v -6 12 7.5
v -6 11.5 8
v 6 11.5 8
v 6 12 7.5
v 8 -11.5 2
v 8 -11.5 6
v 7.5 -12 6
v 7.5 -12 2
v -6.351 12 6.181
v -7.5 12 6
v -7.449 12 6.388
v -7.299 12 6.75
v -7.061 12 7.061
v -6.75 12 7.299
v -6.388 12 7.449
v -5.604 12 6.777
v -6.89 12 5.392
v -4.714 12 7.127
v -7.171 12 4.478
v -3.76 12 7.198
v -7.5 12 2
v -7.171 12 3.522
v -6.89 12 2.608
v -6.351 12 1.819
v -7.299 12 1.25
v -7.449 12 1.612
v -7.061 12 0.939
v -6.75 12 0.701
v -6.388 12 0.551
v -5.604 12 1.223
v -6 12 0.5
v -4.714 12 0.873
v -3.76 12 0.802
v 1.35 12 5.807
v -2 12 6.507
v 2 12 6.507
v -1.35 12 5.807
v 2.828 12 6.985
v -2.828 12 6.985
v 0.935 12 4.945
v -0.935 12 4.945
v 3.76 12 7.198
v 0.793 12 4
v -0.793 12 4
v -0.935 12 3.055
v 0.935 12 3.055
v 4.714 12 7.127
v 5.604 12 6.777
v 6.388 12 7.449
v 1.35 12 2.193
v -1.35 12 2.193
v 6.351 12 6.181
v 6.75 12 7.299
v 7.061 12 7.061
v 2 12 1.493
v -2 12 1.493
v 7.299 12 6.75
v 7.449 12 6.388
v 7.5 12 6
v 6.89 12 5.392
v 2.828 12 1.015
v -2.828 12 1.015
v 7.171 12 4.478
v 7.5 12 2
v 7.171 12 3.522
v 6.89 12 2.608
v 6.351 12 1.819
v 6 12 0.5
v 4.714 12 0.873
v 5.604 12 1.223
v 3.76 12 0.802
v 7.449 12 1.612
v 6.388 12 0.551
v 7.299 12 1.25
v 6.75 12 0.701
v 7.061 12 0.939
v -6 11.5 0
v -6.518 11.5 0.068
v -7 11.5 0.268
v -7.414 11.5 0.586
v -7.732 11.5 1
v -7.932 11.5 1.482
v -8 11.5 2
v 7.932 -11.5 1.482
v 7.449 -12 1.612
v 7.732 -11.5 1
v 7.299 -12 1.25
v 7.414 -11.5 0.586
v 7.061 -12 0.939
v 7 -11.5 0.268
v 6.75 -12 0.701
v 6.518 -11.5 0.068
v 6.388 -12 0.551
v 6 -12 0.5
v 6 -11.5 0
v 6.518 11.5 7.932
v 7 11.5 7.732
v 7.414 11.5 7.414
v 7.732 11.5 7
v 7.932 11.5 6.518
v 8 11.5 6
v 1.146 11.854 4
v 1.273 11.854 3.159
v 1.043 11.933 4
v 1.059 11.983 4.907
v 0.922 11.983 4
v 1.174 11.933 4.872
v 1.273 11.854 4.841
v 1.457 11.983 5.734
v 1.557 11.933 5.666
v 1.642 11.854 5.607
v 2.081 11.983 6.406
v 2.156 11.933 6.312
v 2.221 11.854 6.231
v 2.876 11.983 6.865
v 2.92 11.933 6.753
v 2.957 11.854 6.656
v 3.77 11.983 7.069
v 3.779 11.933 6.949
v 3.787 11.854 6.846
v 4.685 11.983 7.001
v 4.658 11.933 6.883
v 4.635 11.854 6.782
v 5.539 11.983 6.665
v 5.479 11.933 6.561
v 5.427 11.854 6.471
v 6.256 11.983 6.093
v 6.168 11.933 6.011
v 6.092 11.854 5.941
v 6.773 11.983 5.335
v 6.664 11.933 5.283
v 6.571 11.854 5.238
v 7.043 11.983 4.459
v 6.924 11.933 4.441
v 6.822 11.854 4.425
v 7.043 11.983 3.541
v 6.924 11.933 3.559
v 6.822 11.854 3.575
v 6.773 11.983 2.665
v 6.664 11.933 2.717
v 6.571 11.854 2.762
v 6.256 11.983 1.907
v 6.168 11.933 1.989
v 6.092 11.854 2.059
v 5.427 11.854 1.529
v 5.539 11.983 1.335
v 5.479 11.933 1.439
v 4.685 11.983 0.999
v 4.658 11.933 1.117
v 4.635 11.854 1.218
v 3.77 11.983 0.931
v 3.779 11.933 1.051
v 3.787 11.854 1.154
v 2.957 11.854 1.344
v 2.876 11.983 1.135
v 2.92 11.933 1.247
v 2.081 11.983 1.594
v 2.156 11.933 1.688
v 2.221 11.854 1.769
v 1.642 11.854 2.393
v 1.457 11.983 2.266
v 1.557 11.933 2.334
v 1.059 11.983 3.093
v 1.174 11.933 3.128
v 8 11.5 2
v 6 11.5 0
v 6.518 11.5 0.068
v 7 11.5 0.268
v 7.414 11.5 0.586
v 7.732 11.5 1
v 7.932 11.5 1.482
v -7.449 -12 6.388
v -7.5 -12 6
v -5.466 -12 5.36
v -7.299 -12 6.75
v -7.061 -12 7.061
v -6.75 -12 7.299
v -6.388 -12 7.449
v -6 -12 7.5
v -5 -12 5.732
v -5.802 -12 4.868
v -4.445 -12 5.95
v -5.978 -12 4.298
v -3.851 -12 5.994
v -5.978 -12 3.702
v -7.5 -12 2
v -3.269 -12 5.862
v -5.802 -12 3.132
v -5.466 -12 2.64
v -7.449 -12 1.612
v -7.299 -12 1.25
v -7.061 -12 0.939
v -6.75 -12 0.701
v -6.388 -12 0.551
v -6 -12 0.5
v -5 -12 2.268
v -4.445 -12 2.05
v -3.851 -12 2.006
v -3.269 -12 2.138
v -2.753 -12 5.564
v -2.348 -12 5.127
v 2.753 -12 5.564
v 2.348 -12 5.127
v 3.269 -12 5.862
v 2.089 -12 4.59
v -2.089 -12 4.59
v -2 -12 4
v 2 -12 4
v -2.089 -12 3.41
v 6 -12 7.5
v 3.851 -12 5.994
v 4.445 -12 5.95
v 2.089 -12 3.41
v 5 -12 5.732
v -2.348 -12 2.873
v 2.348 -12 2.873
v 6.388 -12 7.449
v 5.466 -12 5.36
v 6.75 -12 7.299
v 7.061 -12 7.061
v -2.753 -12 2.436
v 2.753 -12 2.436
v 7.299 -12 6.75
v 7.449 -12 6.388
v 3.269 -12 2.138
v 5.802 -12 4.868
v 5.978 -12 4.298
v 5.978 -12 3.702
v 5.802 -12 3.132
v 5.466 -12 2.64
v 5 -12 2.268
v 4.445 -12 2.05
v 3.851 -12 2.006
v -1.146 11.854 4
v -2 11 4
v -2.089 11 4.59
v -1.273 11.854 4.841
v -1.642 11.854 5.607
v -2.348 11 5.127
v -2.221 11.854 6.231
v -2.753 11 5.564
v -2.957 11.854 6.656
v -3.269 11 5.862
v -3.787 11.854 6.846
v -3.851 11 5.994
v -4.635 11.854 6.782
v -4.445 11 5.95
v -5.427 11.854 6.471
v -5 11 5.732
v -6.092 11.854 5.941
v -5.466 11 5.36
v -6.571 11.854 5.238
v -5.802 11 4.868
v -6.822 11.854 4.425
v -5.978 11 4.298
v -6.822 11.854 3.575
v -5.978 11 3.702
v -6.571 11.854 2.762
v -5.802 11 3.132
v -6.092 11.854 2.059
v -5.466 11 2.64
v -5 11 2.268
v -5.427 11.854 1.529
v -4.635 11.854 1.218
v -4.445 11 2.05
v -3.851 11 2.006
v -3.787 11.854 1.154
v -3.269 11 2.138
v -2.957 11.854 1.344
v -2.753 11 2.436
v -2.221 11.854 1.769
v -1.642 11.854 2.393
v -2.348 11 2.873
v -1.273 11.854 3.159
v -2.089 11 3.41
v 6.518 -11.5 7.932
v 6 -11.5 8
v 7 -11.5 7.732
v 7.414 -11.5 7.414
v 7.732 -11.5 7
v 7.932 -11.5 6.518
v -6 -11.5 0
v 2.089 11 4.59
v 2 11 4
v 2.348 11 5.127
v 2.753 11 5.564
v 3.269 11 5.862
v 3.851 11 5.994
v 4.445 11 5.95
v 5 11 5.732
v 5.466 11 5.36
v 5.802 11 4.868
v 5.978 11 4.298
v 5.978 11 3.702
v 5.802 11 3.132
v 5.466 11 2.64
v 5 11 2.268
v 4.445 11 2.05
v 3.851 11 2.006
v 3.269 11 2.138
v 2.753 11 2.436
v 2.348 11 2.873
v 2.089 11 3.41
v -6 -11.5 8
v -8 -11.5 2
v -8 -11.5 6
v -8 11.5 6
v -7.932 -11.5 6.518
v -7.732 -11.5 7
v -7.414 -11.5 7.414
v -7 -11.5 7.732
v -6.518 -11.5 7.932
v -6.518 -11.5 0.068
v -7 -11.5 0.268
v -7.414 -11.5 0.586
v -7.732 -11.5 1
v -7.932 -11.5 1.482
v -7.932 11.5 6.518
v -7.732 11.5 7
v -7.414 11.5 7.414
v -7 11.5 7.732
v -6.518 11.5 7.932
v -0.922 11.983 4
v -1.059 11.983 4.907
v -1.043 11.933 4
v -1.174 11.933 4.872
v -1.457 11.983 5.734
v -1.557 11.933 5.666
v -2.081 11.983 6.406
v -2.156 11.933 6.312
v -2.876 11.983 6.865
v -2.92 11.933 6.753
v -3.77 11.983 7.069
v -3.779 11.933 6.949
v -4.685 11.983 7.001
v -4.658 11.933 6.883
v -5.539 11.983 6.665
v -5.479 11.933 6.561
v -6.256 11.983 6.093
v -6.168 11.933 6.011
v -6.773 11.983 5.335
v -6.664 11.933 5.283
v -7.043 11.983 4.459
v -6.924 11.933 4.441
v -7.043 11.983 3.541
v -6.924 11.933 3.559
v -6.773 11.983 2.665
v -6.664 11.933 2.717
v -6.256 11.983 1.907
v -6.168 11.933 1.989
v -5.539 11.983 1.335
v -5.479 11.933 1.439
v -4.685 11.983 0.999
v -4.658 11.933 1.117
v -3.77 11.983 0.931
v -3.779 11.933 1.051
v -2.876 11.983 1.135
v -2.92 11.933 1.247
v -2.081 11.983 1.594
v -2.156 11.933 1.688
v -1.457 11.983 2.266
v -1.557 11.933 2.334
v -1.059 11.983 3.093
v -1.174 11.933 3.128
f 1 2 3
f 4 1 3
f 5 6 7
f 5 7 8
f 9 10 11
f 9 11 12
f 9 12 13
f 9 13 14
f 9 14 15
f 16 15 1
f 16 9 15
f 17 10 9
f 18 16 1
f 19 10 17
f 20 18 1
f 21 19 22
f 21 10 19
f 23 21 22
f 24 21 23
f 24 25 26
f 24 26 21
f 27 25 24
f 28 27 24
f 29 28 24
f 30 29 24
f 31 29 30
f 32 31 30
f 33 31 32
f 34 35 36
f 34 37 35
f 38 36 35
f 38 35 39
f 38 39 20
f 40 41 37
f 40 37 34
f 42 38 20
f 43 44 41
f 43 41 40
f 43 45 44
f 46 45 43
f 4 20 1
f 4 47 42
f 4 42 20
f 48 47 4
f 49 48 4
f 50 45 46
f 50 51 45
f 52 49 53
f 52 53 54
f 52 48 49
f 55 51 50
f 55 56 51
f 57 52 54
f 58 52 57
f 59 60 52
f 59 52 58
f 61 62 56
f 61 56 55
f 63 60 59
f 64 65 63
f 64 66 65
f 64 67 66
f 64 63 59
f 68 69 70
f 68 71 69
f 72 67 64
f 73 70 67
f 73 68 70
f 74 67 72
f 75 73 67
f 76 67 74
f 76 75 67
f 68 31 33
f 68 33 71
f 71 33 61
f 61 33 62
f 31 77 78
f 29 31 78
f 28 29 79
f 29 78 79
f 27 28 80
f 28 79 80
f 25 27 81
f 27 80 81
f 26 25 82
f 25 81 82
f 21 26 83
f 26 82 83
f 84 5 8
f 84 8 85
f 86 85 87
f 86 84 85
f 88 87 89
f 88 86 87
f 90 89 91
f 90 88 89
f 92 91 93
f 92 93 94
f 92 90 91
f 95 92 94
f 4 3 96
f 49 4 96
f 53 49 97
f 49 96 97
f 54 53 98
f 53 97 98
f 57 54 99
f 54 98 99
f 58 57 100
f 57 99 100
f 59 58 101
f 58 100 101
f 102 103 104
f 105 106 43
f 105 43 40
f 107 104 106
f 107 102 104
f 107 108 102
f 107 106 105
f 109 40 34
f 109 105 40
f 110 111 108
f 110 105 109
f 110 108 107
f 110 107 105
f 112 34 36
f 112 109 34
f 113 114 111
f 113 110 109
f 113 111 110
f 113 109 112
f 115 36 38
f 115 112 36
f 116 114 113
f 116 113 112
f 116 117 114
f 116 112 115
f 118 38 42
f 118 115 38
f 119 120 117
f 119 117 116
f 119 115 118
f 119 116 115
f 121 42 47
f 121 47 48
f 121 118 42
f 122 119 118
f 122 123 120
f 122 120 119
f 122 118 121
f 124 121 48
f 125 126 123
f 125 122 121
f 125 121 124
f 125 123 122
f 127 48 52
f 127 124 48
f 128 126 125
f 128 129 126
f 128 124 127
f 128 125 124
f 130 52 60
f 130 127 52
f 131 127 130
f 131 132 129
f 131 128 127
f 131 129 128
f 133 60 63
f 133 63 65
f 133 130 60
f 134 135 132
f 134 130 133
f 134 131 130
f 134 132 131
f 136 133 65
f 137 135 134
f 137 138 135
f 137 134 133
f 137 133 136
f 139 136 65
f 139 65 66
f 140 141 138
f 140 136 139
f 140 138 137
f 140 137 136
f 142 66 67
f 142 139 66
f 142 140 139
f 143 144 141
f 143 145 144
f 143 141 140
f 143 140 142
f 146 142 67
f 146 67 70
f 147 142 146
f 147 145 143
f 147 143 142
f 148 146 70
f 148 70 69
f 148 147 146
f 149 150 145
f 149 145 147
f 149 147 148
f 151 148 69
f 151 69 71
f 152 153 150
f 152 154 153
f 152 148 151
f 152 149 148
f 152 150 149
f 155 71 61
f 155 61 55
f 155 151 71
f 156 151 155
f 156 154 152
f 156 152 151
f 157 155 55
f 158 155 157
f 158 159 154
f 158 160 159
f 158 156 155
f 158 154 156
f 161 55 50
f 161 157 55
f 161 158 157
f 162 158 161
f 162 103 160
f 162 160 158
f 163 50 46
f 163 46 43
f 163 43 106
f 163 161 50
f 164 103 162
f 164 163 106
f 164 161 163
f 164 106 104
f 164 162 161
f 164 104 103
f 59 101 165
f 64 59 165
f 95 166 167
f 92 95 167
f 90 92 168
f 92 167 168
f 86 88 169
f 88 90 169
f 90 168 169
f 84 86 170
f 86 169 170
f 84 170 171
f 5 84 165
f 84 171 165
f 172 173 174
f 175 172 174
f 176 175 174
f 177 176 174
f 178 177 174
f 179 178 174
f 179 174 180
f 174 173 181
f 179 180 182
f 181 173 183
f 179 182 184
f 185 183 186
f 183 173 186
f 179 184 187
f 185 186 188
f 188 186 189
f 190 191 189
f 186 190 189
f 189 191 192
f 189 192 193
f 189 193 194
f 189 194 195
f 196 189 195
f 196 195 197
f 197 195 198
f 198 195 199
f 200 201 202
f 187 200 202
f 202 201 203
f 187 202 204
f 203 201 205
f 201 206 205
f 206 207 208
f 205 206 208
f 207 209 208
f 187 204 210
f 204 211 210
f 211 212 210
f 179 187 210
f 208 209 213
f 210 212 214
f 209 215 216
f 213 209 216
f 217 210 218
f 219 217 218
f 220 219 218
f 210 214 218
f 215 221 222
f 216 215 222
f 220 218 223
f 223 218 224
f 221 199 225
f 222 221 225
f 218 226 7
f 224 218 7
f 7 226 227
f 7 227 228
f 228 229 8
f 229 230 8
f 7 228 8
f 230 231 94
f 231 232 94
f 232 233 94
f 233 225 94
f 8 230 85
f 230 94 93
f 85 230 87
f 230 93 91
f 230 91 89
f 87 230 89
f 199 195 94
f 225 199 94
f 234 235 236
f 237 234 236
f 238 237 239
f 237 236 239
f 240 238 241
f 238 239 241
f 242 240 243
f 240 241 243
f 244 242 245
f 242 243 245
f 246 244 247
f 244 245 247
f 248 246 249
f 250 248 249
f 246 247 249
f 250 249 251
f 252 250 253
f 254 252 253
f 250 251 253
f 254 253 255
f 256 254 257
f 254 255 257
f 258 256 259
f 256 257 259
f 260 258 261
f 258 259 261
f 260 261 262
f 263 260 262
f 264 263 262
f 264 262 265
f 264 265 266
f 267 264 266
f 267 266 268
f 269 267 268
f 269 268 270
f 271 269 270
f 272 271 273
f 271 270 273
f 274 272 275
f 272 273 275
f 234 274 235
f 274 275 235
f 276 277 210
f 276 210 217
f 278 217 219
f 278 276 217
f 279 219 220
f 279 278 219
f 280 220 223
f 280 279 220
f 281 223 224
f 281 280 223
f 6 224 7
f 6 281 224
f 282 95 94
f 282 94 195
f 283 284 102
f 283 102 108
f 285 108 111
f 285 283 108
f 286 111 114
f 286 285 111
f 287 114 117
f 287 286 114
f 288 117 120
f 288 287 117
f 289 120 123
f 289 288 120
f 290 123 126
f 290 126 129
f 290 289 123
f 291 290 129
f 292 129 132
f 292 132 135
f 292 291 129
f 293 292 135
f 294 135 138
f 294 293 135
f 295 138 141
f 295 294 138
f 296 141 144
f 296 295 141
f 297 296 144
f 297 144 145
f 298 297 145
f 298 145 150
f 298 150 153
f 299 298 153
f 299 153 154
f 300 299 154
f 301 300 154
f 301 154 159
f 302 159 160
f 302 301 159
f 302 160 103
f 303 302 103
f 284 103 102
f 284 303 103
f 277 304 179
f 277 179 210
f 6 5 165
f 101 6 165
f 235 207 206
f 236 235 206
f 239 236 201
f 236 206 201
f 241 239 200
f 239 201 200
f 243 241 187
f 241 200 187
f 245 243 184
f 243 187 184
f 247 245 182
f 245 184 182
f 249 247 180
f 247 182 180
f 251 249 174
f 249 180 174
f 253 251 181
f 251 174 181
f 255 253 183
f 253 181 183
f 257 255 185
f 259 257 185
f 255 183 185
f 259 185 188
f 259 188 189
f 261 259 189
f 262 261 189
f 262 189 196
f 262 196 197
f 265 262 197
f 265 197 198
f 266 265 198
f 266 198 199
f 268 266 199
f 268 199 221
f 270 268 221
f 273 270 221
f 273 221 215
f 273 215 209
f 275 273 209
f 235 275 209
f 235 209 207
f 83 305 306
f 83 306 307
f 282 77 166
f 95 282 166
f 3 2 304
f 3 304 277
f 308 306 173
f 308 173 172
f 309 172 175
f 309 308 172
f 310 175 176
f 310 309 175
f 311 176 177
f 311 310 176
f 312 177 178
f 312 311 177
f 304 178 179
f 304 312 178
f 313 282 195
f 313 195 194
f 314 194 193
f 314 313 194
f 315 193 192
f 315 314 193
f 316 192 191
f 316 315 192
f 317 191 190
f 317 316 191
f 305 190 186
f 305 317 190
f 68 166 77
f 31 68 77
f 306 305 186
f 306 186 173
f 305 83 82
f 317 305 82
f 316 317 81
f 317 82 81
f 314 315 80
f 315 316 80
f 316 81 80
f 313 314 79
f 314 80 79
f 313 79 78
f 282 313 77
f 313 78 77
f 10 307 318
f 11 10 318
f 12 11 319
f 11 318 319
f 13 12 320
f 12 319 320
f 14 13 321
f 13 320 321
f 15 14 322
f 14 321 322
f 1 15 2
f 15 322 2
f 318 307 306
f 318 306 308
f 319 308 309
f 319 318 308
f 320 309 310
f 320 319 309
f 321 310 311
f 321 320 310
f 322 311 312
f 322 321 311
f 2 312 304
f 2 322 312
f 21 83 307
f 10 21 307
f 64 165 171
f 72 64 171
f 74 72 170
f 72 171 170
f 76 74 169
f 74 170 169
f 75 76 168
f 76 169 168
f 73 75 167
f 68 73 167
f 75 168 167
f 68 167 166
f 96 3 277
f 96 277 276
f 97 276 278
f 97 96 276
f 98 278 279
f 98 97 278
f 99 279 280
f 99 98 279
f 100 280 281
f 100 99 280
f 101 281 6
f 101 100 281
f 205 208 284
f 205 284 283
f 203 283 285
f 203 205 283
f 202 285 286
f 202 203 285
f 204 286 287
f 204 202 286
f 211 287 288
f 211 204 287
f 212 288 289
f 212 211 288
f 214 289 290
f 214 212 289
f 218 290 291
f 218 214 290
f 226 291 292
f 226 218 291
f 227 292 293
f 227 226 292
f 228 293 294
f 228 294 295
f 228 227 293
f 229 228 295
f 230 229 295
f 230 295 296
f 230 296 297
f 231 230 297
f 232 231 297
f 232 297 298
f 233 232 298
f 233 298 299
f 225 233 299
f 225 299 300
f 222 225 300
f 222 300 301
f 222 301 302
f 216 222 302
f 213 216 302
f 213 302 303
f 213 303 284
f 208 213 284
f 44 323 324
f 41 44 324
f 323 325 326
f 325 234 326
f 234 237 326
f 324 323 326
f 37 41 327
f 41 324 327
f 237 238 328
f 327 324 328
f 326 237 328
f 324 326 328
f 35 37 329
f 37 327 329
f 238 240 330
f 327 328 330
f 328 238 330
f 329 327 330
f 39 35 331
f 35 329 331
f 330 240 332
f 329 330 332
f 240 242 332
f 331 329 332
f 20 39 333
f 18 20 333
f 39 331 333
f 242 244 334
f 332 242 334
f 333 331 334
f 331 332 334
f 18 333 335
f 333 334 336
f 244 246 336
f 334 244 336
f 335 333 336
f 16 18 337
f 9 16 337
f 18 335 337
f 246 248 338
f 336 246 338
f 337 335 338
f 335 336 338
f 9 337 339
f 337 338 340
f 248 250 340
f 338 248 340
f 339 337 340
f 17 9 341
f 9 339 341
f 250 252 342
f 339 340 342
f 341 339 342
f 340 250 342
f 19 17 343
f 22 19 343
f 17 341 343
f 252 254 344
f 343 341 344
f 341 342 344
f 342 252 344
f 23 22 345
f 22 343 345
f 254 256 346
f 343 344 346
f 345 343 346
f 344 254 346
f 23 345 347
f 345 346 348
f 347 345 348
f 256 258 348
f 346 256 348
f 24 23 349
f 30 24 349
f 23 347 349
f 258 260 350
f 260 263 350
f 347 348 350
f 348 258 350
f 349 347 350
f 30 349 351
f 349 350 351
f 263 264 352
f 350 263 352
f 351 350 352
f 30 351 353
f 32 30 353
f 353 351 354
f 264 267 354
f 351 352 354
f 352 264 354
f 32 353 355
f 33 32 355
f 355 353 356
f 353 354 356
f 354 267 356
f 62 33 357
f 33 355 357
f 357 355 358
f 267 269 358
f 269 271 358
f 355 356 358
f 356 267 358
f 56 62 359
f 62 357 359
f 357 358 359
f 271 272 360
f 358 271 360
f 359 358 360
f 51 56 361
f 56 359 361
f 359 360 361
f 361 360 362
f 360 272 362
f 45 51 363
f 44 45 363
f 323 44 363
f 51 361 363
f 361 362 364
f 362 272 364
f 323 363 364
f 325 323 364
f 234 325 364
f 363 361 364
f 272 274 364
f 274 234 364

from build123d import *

# Parameters (mm, degrees)
F0_W     = 16
F0_H     = 24
F1_DEPTH = 8
F2_R     = 2
F3_DEPTH = 50
F5_R     = 2
F6_SIZE  = 0.5
F7_SIZE  = 1
F8_R     = 0.5


with BuildPart() as f1:
    # F0 (on Top) → F1 (new body)
    with BuildSketch(Plane.XY):
        Rectangle(F0_W, F0_H)
    extrude(amount=F1_DEPTH)

    # F2 (on face) → F3 (cut)
    with BuildSketch(Plane.XZ.offset(12)):
        with Locations((-4, 4)):
            Circle(F2_R)
    extrude(amount=-F3_DEPTH, mode=Mode.SUBTRACT)

    # F4: F1 across plane


with BuildPart() as f1_1:
    add(f1.part)
    add(f1.part.mirror(Plane.YZ), mode=Mode.INTERSECT)

    # F5
    f5_edges = [f1_1.edges().sort_by_distance(p)[0] for p in [
        (-8, 0, 8),
        (8, 0, 8),
        (8, 0, 0),
        (-8, 0, 0),
    ]]
    fillet(f5_edges, radius=F5_R)

    # F6
    f6_edges = [f1_1.edges().sort_by_distance(p)[0] for p in [
        (0, -12, 8),
        (0, 12, 8),
        (8, 12, 4),
        (7.414214, 12, 0.585786),
        (7.414214, 12, 7.414214),
        (0, 12, 0),
        (-7.414214, 12, 0.585786),
        (-7.414214, 12, 7.414214),
        (-8, 12, 4),
        (8, -12, 4),
        (7.414214, -12, 0.585786),
        (7.414214, -12, 7.414214),
        (0, -12, 0),
        (-7.414214, -12, 0.585786),
        (-7.414214, -12, 7.414214),
        (-8, -12, 4),
    ]]
    chamfer(f6_edges, length=F6_SIZE)

    # F7
    f7_edges = [f1_1.edges().sort_by_distance(p)[0] for p in [
        (6, 12, 4),
        (-6, 12, 4),
    ]]
    chamfer(f7_edges, length=F7_SIZE)

    # F8
    f8_edges = [f1_1.edges().sort_by_distance(p)[0] for p in [
        (-7, 12, 4),
        (7, 12, 4),
    ]]
    fillet(f8_edges, radius=F8_R)


solid = f1_1.part
